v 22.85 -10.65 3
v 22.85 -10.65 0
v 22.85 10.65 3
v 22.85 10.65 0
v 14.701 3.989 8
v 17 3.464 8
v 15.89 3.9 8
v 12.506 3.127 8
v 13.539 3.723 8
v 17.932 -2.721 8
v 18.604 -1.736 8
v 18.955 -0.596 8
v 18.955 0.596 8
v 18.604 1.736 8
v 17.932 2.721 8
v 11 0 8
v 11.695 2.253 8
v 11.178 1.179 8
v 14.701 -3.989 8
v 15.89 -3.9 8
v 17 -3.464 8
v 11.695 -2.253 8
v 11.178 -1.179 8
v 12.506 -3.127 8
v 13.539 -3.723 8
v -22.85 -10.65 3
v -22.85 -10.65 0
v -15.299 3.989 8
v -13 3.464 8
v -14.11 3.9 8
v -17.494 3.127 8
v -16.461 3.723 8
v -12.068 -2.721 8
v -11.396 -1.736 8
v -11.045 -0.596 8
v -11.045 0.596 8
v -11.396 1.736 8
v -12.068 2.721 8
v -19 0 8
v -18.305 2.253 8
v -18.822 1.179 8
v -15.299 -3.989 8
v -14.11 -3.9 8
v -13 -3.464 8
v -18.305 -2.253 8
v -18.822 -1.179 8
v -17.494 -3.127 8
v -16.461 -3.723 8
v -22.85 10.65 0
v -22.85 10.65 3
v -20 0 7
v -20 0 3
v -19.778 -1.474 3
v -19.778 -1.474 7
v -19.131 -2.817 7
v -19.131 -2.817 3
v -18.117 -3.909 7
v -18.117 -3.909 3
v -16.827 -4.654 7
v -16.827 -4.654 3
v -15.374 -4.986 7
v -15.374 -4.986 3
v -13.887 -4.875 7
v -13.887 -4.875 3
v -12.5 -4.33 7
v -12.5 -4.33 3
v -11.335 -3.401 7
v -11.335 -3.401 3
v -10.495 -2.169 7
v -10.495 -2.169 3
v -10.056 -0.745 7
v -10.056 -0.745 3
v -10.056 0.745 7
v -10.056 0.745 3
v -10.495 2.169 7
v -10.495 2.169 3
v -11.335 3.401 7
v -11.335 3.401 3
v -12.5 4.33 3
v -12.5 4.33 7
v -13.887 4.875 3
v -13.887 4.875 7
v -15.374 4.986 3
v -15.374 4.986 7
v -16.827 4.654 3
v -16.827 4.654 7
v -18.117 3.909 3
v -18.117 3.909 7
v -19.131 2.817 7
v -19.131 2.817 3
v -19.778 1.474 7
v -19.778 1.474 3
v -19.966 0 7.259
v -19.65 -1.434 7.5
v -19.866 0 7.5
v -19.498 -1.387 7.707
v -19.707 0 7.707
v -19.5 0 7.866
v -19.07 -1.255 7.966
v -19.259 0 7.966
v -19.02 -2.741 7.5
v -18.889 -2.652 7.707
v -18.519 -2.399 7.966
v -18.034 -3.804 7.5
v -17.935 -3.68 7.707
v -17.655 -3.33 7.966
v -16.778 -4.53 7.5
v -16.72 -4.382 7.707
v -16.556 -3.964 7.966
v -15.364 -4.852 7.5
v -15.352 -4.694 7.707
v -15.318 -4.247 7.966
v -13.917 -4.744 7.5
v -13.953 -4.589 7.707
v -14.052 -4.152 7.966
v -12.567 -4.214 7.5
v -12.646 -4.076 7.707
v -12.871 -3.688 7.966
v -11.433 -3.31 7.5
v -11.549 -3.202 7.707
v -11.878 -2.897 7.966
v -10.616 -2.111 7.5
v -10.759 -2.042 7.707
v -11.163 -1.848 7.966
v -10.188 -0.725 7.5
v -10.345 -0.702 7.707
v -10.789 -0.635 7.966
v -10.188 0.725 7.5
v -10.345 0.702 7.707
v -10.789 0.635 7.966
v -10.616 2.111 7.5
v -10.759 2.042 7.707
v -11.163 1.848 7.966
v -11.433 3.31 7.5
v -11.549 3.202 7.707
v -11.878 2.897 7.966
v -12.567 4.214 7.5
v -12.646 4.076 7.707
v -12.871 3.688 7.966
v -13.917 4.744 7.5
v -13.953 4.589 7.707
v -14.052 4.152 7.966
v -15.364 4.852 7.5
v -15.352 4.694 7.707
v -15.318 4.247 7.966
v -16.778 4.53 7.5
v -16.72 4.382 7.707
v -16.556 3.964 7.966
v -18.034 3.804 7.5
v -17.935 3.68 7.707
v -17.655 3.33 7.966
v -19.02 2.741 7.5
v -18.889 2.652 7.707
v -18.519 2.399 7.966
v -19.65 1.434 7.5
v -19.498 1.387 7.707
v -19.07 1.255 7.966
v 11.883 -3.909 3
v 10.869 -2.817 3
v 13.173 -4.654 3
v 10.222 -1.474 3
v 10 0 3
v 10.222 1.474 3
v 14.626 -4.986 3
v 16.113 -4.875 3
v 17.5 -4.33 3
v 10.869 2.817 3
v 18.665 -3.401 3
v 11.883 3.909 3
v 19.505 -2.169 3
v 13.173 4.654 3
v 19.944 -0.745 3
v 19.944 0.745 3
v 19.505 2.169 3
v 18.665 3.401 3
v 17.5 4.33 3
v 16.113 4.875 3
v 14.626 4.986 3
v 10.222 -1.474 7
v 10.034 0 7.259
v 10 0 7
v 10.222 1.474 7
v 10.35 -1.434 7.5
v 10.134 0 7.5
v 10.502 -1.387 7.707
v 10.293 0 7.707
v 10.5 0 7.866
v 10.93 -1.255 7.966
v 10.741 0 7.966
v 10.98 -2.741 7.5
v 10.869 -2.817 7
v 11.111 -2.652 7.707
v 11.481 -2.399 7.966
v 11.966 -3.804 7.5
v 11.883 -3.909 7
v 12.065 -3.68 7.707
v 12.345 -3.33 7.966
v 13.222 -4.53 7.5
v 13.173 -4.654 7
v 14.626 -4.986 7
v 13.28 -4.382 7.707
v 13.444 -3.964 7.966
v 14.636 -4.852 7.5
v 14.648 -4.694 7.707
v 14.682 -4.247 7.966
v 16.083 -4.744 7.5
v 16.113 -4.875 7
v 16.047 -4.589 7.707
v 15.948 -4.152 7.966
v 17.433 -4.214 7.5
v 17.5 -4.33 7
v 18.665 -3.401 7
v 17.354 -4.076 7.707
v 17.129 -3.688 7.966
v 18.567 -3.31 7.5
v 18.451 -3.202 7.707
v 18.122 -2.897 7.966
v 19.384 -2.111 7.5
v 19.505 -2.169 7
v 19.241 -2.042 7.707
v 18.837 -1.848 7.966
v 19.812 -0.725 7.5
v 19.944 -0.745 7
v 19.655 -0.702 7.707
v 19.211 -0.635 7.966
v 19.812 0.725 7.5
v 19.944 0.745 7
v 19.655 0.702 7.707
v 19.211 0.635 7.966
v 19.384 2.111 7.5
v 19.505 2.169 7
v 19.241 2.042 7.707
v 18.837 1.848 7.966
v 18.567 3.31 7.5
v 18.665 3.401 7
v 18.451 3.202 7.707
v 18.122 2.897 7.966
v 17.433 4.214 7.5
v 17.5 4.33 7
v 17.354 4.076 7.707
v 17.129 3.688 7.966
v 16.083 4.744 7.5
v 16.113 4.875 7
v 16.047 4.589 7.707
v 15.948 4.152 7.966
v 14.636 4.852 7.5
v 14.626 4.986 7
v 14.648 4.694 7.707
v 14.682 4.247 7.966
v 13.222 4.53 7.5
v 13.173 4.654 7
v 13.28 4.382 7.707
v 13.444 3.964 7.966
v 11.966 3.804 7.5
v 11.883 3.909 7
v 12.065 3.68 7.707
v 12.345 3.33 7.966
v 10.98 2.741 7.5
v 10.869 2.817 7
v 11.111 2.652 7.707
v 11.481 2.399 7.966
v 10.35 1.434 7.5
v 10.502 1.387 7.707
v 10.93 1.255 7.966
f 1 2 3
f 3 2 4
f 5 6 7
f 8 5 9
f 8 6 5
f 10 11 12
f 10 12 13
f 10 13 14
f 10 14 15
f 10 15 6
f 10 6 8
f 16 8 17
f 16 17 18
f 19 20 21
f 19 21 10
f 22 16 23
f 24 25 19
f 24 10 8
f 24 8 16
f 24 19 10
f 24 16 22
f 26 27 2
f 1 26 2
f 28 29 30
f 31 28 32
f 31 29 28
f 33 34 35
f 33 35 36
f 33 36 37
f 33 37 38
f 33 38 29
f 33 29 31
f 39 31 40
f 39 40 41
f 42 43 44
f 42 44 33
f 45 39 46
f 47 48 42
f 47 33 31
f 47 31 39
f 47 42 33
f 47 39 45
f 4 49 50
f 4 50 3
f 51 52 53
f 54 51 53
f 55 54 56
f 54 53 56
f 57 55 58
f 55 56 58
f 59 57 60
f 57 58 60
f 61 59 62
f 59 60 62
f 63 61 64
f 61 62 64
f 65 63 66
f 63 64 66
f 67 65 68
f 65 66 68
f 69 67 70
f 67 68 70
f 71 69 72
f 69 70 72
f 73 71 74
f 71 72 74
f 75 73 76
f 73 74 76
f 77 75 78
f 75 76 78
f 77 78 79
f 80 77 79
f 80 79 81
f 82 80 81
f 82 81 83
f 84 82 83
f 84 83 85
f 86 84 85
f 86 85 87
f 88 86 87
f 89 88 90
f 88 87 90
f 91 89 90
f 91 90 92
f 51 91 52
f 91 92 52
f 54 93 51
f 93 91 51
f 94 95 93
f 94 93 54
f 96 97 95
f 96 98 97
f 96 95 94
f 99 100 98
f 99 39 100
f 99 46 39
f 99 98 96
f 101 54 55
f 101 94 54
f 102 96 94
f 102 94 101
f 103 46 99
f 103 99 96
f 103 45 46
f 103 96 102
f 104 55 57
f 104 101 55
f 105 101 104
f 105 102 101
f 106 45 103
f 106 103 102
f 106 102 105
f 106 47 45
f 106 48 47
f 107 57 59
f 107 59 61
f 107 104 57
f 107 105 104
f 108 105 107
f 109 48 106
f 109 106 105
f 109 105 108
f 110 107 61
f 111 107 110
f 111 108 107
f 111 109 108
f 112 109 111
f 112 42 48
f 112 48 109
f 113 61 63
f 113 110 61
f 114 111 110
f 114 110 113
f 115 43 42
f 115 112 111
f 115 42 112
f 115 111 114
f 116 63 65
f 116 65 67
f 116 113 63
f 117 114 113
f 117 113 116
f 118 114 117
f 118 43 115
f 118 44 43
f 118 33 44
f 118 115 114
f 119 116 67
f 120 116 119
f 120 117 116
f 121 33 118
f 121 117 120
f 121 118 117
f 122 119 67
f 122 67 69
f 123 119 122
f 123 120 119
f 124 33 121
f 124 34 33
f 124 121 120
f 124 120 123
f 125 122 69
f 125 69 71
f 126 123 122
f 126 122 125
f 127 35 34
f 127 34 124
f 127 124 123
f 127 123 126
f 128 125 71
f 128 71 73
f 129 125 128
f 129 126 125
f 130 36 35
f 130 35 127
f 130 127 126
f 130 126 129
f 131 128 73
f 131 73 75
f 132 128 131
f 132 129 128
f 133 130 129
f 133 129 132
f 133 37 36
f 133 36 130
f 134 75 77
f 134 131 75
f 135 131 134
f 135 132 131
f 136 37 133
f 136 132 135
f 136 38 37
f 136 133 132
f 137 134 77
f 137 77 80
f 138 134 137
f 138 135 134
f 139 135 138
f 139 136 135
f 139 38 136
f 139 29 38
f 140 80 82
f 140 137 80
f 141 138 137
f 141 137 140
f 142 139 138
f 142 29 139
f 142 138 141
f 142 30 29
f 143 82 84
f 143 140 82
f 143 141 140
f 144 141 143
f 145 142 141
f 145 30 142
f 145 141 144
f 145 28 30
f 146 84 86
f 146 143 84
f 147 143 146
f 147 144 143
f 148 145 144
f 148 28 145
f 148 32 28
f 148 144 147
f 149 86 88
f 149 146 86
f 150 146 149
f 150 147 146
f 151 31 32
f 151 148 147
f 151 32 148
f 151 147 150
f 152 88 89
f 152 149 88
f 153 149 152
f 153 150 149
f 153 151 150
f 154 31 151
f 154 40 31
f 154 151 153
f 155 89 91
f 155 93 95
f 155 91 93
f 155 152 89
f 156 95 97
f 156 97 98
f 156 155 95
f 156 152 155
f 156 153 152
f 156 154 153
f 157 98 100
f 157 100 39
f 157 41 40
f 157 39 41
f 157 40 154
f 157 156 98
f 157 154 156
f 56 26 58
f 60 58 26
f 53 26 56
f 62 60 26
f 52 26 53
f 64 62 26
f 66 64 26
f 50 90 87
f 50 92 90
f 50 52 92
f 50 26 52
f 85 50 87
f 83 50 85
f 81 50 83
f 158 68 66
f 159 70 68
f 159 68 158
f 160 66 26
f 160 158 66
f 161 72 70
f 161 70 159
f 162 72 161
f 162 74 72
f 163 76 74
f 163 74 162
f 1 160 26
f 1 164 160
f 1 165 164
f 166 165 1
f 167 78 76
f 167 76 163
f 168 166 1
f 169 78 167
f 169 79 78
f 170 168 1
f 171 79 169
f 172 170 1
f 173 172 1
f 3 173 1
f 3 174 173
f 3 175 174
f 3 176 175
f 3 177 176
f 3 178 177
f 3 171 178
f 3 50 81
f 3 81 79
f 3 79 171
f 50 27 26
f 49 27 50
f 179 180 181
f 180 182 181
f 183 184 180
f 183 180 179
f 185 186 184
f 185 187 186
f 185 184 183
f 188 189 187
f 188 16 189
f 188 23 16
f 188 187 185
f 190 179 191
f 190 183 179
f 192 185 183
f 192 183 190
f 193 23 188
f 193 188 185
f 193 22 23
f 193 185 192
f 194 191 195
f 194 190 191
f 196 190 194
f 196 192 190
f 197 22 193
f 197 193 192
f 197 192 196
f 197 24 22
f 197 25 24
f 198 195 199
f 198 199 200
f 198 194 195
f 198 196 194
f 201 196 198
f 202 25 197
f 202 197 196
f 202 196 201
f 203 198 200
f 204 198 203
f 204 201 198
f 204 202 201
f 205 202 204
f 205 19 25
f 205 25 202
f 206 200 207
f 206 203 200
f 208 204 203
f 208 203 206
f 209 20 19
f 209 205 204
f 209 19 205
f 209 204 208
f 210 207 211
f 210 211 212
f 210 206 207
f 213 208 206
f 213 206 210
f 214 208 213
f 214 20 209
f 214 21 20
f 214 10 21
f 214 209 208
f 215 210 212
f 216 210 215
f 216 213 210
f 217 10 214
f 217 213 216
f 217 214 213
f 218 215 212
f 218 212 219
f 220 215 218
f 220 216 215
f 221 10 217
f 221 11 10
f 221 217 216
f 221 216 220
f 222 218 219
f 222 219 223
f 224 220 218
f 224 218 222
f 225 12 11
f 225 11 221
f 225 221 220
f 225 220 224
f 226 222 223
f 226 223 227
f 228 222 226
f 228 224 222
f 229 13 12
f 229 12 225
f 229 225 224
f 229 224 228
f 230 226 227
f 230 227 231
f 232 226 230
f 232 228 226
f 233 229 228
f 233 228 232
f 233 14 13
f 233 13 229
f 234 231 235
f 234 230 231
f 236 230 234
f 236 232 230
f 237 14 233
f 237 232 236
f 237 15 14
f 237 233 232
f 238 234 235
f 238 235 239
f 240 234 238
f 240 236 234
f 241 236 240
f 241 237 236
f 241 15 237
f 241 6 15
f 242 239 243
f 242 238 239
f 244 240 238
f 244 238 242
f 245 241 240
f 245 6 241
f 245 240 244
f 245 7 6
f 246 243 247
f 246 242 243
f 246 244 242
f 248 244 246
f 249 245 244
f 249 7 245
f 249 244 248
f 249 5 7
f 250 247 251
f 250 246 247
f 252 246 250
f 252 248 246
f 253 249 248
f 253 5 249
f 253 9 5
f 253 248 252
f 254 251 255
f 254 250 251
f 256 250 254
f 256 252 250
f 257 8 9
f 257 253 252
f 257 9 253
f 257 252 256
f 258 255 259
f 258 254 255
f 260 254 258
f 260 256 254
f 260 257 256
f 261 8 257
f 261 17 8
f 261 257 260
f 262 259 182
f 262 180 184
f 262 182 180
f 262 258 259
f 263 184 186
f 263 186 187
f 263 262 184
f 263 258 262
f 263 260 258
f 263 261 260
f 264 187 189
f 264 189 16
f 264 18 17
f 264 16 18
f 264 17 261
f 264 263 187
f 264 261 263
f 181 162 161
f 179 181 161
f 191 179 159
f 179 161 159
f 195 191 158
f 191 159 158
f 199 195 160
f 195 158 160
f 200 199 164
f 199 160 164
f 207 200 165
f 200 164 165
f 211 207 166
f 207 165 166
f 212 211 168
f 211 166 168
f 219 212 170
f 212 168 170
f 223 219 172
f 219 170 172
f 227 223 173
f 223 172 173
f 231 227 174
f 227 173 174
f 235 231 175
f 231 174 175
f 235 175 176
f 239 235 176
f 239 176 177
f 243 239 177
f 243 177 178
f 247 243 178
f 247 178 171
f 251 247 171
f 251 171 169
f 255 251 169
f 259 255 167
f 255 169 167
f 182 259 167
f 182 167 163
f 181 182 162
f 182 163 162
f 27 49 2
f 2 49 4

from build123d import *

# Parameters (mm, degrees)
SKETCH1_W           = 45.7
SKETCH1_H           = 21.3
BOSS_EXTRUDE1_DEPTH = 3
SKETCH2_R           = 5
BOSS_EXTRUDE2_DEPTH = 5
FILLET1_R           = 1


with BuildPart() as part:
    # Sketch1 → Boss-Extrude1 (new body)
    with BuildSketch(Plane.XY):
        Rectangle(SKETCH1_W, SKETCH1_H)
    extrude(amount=BOSS_EXTRUDE1_DEPTH)

    # Sketch2 → Boss-Extrude2 (add)
    with BuildSketch(Plane.XY.offset(3)):
        with Locations(Location((-15, 0, 0), (0, 0, 180))):
            Circle(SKETCH2_R)
        with Locations(Location((15, 0, 0), (0, 0, 180))):
            Circle(SKETCH2_R)
    extrude(amount=BOSS_EXTRUDE2_DEPTH)

    # Fillet1
    fillet1_edges = [part.edges().sort_by_distance(p)[0] for p in [
        (-10, 0, 8),
        (20, 0, 8),
    ]]
    fillet(fillet1_edges, radius=FILLET1_R)


solid = part.part
